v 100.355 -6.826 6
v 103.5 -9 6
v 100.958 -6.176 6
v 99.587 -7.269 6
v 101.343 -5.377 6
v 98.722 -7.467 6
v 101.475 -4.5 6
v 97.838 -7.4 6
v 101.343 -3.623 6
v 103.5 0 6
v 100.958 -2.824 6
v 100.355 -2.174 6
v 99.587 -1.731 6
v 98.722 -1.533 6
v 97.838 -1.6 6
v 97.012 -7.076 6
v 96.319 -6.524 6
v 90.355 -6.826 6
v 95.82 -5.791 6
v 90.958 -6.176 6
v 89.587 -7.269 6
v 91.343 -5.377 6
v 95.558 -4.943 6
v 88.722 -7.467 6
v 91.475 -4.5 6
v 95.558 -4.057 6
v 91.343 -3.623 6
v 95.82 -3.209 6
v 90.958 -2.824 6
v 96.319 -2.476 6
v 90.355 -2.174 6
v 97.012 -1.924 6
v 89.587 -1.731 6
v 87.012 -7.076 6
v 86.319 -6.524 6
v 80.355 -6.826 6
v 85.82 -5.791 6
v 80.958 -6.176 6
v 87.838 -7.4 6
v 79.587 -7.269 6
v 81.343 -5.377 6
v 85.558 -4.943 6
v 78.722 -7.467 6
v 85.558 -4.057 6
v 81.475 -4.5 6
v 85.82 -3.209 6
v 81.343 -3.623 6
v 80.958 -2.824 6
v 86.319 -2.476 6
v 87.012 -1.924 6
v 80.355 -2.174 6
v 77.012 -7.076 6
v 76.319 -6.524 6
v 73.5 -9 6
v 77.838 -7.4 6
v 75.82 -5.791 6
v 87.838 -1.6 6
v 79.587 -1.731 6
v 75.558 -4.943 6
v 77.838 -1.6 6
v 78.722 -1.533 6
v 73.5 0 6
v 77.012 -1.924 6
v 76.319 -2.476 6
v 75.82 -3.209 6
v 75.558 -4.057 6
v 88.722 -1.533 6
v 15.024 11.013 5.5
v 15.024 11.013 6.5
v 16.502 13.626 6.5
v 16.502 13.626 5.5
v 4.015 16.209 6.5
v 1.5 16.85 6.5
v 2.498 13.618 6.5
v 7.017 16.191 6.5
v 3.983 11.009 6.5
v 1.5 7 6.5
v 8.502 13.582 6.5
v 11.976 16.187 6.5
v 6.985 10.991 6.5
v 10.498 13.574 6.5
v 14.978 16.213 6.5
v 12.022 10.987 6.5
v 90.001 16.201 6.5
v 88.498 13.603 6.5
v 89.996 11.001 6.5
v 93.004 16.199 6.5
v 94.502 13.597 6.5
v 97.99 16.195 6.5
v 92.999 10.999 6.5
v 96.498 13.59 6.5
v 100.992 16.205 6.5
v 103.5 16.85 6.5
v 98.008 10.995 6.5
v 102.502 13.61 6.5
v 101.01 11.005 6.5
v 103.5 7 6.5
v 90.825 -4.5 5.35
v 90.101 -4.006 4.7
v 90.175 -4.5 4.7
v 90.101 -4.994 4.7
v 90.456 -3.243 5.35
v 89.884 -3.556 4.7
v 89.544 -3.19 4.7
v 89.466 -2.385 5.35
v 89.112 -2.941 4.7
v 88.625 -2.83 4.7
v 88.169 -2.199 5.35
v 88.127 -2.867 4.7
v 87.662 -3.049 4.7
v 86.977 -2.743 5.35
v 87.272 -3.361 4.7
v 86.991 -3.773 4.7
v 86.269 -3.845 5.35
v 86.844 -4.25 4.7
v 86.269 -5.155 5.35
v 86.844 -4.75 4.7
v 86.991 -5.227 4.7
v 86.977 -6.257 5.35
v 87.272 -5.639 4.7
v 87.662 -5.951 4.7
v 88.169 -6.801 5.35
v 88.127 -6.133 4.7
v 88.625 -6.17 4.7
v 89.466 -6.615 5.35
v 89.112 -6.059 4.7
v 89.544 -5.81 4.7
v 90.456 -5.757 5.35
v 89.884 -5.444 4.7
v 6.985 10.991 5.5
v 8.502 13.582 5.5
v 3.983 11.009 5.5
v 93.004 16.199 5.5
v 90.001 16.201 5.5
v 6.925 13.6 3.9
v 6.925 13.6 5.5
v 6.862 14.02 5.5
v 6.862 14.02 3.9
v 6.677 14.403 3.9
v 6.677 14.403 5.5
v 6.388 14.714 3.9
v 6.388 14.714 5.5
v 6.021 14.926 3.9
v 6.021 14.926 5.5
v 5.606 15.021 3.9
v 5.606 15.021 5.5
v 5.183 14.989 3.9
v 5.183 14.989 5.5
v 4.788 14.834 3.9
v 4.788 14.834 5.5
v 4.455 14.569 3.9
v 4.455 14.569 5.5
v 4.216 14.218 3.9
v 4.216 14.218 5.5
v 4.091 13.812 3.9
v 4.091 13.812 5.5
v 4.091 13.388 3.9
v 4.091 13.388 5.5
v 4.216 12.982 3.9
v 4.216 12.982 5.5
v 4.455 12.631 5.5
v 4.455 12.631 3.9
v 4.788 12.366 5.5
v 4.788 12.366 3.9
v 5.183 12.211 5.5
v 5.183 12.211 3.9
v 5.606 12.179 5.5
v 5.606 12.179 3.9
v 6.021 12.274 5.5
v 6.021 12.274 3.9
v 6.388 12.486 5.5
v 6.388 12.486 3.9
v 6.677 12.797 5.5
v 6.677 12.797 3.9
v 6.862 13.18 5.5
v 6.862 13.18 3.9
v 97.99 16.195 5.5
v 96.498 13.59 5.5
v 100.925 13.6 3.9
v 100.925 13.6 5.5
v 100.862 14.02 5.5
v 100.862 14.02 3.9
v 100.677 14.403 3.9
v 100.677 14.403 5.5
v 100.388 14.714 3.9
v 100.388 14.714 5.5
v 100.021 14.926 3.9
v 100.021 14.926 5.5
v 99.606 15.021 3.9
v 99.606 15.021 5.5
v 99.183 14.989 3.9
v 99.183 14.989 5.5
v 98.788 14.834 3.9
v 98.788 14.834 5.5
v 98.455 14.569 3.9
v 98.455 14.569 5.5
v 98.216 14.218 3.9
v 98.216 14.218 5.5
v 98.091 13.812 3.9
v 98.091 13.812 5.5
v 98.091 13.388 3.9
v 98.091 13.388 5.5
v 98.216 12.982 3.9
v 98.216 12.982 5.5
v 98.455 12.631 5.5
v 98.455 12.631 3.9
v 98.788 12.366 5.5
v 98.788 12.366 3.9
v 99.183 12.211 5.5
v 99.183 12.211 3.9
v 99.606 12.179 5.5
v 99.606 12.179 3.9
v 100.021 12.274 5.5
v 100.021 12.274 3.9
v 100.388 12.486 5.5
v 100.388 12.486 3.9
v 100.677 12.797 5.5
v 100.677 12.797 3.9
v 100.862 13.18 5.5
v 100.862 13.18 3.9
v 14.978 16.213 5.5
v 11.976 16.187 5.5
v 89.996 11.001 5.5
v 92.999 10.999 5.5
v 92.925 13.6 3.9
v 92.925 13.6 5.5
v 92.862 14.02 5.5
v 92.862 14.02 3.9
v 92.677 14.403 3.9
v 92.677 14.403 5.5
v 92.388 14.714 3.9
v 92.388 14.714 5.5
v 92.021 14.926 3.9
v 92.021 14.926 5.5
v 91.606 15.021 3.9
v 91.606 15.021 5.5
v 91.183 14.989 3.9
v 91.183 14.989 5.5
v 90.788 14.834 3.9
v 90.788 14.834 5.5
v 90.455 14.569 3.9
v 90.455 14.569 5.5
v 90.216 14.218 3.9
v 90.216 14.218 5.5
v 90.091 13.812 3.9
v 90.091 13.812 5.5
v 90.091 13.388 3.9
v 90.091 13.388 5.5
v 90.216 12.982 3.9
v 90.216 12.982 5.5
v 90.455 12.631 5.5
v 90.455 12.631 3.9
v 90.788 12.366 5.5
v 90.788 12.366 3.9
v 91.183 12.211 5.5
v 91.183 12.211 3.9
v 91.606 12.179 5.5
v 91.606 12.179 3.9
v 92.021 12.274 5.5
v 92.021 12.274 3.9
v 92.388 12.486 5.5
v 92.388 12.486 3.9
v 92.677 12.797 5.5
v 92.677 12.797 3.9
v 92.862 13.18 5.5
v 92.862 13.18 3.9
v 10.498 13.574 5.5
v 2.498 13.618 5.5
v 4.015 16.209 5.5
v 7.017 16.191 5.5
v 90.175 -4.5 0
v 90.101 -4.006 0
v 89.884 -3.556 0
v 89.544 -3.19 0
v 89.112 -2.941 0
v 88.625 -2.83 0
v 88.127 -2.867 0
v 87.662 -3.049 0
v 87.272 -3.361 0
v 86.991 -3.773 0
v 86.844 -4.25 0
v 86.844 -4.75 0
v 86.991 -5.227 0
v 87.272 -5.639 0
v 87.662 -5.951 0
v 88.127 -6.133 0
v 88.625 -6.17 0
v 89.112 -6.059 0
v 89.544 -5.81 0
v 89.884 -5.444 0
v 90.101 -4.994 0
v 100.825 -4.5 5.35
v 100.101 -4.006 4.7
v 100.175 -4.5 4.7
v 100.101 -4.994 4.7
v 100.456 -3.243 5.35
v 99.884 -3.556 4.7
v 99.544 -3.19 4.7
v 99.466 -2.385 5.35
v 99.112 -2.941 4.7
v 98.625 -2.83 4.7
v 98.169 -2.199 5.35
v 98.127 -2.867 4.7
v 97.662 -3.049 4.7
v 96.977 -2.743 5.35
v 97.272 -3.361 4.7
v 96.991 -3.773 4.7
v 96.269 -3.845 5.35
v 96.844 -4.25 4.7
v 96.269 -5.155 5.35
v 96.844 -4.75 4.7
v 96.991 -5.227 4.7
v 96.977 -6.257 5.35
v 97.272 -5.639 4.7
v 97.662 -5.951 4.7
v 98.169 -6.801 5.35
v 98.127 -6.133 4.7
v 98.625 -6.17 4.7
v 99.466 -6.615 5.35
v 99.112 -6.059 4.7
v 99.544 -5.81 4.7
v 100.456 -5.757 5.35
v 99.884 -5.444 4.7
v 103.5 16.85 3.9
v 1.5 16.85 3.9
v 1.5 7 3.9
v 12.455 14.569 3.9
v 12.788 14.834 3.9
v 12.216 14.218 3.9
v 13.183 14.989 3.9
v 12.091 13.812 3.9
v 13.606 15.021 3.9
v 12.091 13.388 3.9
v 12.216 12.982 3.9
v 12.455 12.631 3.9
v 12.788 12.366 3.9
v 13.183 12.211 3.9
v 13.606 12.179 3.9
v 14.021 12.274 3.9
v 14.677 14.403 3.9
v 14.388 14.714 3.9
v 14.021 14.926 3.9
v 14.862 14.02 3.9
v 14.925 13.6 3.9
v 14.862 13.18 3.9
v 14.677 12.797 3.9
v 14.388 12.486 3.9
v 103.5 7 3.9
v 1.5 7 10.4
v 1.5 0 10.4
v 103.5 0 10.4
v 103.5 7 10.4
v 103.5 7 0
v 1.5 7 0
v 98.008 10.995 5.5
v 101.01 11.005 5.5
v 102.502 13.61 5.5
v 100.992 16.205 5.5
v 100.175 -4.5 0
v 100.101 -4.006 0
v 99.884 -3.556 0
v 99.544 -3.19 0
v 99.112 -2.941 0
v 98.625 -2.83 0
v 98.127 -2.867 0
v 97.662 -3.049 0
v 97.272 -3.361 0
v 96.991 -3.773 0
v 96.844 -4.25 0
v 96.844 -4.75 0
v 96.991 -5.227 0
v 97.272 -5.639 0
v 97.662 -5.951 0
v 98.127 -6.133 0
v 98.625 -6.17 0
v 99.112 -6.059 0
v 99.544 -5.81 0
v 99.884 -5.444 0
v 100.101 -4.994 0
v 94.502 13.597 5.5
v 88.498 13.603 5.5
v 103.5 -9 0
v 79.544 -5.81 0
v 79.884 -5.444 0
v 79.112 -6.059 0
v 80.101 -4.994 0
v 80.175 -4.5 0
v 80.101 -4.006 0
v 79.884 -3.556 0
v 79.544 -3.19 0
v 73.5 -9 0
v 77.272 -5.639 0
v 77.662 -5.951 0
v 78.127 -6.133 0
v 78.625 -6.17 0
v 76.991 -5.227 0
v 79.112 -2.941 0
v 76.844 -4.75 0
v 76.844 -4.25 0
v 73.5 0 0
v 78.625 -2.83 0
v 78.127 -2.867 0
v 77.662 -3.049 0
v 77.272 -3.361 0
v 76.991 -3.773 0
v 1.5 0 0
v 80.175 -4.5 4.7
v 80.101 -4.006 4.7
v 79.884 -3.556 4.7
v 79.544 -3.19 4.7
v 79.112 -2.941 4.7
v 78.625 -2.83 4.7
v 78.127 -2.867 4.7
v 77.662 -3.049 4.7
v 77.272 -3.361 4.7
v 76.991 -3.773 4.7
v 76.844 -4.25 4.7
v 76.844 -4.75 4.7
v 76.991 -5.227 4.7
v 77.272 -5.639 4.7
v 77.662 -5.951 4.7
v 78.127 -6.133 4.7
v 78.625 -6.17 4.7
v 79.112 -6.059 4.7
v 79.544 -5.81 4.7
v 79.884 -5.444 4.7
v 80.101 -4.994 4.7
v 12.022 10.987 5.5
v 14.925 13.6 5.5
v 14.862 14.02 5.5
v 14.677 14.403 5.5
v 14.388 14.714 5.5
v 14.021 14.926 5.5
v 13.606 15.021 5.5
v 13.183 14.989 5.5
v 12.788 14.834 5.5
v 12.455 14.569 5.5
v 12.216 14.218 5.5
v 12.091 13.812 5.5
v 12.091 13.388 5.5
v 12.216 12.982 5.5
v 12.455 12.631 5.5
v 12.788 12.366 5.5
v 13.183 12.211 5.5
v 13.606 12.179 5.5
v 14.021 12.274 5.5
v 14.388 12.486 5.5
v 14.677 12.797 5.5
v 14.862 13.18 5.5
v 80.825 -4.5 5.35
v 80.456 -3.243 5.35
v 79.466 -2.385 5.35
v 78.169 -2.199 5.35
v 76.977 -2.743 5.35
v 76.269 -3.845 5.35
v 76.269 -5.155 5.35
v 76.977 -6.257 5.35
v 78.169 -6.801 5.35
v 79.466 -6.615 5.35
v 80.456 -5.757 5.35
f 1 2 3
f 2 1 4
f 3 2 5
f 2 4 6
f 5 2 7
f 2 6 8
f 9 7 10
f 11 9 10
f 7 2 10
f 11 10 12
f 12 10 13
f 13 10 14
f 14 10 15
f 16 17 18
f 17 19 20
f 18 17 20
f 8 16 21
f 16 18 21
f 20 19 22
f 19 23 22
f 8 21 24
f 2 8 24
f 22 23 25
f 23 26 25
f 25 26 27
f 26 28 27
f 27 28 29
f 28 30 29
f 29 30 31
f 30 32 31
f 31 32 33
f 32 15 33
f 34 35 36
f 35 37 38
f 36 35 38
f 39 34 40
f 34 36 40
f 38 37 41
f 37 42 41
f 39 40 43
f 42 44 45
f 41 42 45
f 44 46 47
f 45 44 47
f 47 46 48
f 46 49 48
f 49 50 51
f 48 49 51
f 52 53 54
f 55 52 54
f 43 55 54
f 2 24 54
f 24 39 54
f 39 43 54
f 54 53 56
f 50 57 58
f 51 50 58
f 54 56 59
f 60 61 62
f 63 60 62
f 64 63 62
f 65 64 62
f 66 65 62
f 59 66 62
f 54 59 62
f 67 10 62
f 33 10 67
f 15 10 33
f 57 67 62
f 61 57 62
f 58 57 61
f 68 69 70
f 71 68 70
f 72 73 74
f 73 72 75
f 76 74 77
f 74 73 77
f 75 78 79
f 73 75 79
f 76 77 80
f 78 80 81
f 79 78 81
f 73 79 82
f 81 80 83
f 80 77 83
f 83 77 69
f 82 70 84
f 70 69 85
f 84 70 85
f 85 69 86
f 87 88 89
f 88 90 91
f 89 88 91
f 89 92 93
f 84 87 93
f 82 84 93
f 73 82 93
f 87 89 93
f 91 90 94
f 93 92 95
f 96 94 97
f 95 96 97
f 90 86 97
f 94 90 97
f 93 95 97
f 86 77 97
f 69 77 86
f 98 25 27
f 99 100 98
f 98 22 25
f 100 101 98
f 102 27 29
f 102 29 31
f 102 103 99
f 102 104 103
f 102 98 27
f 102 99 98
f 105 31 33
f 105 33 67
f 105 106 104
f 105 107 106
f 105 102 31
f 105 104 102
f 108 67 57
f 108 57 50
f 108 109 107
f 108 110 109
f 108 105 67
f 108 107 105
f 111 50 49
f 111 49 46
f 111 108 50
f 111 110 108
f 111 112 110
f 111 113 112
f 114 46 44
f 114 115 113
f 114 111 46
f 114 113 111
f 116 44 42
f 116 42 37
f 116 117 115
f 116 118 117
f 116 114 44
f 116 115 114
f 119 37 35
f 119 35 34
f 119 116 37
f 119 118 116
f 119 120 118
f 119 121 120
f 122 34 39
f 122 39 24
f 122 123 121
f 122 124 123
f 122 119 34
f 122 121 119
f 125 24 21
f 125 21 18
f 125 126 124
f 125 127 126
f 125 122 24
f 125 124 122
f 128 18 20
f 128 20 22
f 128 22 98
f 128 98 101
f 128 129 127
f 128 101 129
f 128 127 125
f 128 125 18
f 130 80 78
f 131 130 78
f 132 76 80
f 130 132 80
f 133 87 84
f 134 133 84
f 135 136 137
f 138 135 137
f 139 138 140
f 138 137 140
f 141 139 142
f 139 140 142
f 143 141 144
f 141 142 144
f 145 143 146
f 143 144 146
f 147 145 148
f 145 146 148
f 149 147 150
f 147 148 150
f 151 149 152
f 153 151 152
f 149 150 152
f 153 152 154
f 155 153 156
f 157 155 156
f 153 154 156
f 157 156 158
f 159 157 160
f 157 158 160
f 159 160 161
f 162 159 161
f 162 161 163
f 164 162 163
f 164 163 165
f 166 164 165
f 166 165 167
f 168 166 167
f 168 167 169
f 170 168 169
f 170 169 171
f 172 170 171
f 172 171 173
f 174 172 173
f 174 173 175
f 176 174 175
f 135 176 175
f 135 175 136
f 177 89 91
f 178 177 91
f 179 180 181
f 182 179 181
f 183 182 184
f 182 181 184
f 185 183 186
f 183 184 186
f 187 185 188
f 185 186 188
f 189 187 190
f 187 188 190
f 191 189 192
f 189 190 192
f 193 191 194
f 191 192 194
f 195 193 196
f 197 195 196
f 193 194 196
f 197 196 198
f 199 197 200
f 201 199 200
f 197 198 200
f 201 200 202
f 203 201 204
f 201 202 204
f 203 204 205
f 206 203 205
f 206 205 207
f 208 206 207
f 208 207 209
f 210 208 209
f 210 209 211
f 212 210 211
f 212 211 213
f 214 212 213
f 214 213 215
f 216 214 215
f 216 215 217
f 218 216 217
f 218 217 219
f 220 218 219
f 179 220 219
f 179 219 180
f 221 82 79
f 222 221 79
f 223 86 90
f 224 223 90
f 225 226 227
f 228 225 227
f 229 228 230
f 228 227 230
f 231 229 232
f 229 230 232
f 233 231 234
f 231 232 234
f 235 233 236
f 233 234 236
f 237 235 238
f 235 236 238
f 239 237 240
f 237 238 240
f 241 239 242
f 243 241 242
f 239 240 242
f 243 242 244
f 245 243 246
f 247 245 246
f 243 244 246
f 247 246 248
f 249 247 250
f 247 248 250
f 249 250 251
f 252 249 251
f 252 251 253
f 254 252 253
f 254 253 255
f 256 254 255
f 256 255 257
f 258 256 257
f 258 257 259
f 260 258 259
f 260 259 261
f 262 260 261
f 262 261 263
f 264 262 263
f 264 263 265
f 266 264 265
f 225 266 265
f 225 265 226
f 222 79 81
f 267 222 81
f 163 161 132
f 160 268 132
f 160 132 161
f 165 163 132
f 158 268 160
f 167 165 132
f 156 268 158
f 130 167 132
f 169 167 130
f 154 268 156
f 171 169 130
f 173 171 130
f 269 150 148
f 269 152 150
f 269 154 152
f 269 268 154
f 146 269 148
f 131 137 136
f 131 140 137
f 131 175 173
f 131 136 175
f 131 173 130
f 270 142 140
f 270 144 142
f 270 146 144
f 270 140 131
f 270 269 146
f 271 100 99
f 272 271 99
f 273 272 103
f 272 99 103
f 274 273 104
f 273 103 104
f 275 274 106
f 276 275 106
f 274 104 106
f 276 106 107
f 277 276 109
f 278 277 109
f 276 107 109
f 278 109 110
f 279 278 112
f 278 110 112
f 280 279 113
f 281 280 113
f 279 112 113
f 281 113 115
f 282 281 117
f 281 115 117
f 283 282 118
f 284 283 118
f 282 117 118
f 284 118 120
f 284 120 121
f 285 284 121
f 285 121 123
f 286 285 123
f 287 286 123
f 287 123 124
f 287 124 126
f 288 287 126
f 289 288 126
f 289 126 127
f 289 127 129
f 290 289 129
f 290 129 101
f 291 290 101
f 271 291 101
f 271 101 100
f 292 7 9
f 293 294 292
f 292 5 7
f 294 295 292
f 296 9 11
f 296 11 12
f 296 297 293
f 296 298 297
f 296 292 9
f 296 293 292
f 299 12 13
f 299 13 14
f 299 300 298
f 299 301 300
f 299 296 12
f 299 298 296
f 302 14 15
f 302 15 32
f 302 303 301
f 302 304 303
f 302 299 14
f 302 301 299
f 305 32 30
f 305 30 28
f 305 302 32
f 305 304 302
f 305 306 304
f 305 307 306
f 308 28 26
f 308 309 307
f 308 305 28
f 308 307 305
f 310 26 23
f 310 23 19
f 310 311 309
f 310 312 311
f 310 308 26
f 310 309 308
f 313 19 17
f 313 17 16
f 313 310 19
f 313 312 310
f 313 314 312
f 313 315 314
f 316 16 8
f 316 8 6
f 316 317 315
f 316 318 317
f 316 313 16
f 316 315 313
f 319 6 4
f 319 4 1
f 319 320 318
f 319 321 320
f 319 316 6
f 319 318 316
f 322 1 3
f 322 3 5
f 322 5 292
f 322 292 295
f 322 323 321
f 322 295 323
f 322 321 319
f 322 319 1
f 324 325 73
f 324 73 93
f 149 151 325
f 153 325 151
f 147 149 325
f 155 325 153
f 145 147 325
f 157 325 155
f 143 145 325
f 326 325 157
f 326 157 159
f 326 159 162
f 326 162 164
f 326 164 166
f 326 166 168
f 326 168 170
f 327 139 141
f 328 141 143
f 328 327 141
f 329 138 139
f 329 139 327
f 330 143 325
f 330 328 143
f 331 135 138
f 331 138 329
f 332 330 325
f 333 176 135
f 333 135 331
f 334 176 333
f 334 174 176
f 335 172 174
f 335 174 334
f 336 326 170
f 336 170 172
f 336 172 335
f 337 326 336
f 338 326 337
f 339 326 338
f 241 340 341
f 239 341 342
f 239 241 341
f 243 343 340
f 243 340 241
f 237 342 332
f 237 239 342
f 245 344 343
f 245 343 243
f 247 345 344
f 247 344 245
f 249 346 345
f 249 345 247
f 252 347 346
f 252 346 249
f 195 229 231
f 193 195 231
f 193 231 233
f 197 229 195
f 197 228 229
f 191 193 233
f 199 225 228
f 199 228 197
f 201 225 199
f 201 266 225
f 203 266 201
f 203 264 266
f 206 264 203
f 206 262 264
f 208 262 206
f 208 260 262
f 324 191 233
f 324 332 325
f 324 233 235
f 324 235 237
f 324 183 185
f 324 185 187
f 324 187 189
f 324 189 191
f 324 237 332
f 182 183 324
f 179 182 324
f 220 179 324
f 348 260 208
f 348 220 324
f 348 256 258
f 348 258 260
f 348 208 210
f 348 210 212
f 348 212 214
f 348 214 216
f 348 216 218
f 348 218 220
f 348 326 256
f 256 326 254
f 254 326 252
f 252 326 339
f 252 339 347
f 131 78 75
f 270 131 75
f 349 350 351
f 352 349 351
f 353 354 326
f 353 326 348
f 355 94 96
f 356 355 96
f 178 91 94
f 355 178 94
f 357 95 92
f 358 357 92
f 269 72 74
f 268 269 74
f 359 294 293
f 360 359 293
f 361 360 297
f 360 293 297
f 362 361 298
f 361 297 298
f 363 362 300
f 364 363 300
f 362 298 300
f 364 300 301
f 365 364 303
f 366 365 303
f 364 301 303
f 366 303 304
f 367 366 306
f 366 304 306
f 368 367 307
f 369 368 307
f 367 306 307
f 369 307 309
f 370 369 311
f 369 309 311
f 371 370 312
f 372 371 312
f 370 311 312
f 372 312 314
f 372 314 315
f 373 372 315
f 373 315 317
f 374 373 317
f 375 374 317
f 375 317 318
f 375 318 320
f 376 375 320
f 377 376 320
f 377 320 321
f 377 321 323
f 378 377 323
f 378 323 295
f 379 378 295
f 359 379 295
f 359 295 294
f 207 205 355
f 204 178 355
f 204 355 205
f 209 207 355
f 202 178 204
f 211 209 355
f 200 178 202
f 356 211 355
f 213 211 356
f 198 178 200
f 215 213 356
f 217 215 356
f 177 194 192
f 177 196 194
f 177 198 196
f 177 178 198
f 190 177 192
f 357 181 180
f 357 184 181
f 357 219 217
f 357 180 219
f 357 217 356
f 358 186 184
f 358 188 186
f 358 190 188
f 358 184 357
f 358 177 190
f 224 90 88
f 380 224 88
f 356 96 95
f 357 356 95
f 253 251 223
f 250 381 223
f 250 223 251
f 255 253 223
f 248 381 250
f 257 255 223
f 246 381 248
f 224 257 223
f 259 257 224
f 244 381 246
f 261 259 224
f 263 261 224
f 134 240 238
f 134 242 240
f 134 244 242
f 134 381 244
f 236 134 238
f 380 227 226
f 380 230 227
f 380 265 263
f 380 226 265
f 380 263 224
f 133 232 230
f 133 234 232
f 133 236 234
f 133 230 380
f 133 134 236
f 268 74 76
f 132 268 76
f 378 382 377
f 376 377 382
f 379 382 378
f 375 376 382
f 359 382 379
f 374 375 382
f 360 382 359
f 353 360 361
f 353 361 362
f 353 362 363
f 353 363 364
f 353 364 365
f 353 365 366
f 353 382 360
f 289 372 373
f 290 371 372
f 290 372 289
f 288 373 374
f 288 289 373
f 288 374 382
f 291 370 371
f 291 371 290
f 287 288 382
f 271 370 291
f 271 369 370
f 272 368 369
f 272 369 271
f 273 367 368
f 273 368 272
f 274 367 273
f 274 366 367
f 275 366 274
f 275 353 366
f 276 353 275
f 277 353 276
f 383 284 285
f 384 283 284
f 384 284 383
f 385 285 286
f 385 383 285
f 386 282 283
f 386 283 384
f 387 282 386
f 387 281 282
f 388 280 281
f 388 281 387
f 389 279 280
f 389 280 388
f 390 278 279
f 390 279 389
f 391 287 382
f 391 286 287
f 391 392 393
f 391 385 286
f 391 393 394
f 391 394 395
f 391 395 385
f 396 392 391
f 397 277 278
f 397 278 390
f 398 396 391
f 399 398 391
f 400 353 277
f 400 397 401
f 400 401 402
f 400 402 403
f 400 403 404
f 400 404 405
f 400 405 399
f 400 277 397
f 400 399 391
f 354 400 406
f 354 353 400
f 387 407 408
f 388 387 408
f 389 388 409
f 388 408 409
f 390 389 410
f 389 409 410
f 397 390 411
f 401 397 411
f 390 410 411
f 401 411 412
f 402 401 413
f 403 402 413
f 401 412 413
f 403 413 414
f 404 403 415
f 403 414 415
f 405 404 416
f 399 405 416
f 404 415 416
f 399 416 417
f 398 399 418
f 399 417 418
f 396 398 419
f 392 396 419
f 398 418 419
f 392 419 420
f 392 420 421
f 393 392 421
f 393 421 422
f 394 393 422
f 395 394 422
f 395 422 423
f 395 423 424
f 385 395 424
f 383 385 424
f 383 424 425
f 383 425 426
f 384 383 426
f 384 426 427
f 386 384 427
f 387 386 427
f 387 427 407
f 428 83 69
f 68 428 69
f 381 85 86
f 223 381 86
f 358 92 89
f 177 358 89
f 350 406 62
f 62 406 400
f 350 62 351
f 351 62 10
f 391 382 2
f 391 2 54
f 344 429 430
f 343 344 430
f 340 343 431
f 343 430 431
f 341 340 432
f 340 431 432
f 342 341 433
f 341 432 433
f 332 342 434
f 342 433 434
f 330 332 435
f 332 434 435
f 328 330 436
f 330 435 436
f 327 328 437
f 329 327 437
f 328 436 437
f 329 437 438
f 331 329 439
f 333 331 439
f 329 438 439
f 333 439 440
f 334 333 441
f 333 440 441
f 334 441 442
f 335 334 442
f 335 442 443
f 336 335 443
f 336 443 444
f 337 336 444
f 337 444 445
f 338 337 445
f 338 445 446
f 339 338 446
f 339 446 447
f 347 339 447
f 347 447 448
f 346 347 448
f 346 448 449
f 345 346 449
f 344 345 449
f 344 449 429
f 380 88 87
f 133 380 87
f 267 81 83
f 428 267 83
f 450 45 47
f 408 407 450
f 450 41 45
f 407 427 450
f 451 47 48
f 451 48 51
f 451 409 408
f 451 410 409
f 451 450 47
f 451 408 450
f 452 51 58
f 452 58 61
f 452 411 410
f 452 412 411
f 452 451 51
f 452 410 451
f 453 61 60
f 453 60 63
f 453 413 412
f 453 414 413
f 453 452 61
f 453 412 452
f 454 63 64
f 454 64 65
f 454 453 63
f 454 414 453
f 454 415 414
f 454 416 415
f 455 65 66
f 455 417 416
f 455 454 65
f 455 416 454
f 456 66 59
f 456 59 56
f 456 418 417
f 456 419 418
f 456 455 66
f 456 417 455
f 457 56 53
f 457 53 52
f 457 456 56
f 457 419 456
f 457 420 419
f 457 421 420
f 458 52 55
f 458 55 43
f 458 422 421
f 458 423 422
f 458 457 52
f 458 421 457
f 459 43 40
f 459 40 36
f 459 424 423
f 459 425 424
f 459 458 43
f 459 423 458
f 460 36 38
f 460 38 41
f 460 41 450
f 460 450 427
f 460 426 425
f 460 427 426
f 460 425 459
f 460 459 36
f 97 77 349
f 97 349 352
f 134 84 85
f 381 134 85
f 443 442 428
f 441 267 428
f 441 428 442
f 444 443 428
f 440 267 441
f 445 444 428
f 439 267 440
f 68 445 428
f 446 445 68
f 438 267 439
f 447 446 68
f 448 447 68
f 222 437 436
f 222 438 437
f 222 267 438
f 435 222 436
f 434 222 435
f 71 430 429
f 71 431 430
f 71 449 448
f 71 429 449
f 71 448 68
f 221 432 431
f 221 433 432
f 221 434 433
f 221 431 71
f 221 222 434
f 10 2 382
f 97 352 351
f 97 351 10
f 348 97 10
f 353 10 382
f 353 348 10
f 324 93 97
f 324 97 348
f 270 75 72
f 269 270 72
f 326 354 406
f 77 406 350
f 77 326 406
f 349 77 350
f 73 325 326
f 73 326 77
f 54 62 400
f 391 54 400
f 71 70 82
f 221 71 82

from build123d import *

# Parameters (mm, degrees)
SKETCH_1_W             = 103.5
SKETCH_1_H             = 10.4
BASE_DEPTH             = 7
SKETCH_3_W             = 30
SKETCH_3_H             = 6
FINGER_CONNECTOR_DEPTH = 9
SKETCH_5_W             = 103.5
SKETCH_5_H             = 2.6
GEAR_CONNECTOR_DEPTH   = 9.85
CUT_EXTRUDE_1_DEPTH    = 1.5
SKETCH_20_R            = 1.425
CUT_EXTRUDE_4_DEPTH    = 106.063897224
SKETCH_22_R            = 1.425
CUT_EXTRUDE_5_DEPTH    = 1
SKETCH_27_R            = 1.675
CUT_EXTRUDE_6_DEPTH    = 10
CHAMFER_2_SIZE         = 1.3


with BuildPart() as part:
    # 草图1 → Base (new body)
    with BuildSketch(Plane(origin=(0, 0, 0), x_dir=(1, 0, 0), z_dir=(0, 1, 0))):
        with Locations((51.75, -5.2)):
            Rectangle(SKETCH_1_W, SKETCH_1_H)
    extrude(amount=BASE_DEPTH)

    # 草图3 → Finger_Connector (add)
    with BuildSketch(Plane(origin=(0, 0, 0), x_dir=(-1, 0, 0), z_dir=(0, -1, 0))):
        with Locations((-88.5, -3)):
            Rectangle(SKETCH_3_W, SKETCH_3_H)
    extrude(amount=FINGER_CONNECTOR_DEPTH)

    # 草图5 → Gear Connector (add)
    with BuildSketch(Plane(origin=(0, 7, 0), x_dir=(1, 0, 0), z_dir=(0, 1, 0))):
        with Locations((51.75, -5.2)):
            Rectangle(SKETCH_5_W, SKETCH_5_H)
    extrude(amount=GEAR_CONNECTOR_DEPTH)

    # 草图6 → 切除-拉伸1 (cut)
    with BuildSketch(Plane.ZY):
        Polygon((3.9, 16.85), (3.9, 7), (0, 7), (0, 0), (10.4, 0), (10.4, 7), (6.5, 7), (6.5, 16.85), align=None)
    extrude(amount=-CUT_EXTRUDE_1_DEPTH, mode=Mode.SUBTRACT)

    # 草图20 → 切除-拉伸4 (cut, through all)
    with BuildSketch(Plane.XY.offset(6.5)):
        with Locations((13.5, 13.6)):
            Circle(SKETCH_20_R)
        with Locations((5.5, 13.6)):
            Circle(SKETCH_20_R)
        with Locations((99.5, 13.6)):
            Circle(SKETCH_20_R)
        with Locations((91.5, 13.6)):
            Circle(SKETCH_20_R)
    extrude(amount=-CUT_EXTRUDE_4_DEPTH, mode=Mode.SUBTRACT)

    # 草图22 → 切除-拉伸5 (cut)
    # profile 1 of 4: a face of its own
    with BuildSketch(Plane.XY.offset(6.5)):
        Polygon((92.998593259, 10.998548179), (94.502219993, 13.597093921), (93.003626735, 16.198545743), (90.001406741, 16.201451821), (88.497780007, 13.602906079), (89.996373265, 11.001454257), align=None)
        with Locations((91.5, 13.6)):
            Circle(SKETCH_22_R, mode=Mode.SUBTRACT)
    # profile 2 of 4: a face of its own
    with BuildSketch(Plane.XY.offset(6.5)):
        Polygon((101.010012931, 11.005160066), (102.502203767, 13.610289591), (100.992190836, 16.205129525), (97.989987069, 16.194839934), (96.497796233, 13.589710409), (98.007809164, 10.994870475), align=None)
        with Locations((99.5, 13.6)):
            Circle(SKETCH_22_R, mode=Mode.SUBTRACT)
    # profile 3 of 4: a face of its own
    with BuildSketch(Plane.XY.offset(6.5)):
        Polygon((15.023964186, 11.013329071), (16.502104828, 13.626456235), (14.978140642, 16.213127164), (11.976035814, 16.186670929), (10.497895172, 13.573543765), (12.021859358, 10.986872836), align=None)
        with Locations((13.5, 13.6)):
            Circle(SKETCH_22_R, mode=Mode.SUBTRACT)
    # profile 4 of 4: a face of its own
    with BuildSketch(Plane.XY.offset(6.5)):
        Polygon((6.985197547, 10.99087724), (8.502165366, 13.581657426), (7.016967818, 16.190780186), (4.014802453, 16.20912276), (2.497834634, 13.618342574), (3.983032182, 11.009219814), align=None)
        with Locations((5.5, 13.6)):
            Circle(SKETCH_22_R, mode=Mode.SUBTRACT)
    extrude(amount=-CUT_EXTRUDE_5_DEPTH, mode=Mode.SUBTRACT)

    # 草图27 → 切除-拉伸6 (cut)
    with BuildSketch(Plane.XY.offset(6)):
        with Locations((98.5, -4.5)):
            Circle(SKETCH_27_R)
        with Locations((88.5, -4.5)):
            Circle(SKETCH_27_R)
        with Locations((78.5, -4.5)):
            Circle(SKETCH_27_R)
    extrude(amount=-CUT_EXTRUDE_6_DEPTH, mode=Mode.SUBTRACT)

    # 倒角2
    chamfer_2_edges = [part.edges().sort_by_distance(p)[0] for p in [
        (76.825, -4.5, 6),
        (86.825, -4.5, 6),
        (96.825, -4.5, 6),
    ]]
    chamfer(chamfer_2_edges, length=CHAMFER_2_SIZE)


solid = part.part
